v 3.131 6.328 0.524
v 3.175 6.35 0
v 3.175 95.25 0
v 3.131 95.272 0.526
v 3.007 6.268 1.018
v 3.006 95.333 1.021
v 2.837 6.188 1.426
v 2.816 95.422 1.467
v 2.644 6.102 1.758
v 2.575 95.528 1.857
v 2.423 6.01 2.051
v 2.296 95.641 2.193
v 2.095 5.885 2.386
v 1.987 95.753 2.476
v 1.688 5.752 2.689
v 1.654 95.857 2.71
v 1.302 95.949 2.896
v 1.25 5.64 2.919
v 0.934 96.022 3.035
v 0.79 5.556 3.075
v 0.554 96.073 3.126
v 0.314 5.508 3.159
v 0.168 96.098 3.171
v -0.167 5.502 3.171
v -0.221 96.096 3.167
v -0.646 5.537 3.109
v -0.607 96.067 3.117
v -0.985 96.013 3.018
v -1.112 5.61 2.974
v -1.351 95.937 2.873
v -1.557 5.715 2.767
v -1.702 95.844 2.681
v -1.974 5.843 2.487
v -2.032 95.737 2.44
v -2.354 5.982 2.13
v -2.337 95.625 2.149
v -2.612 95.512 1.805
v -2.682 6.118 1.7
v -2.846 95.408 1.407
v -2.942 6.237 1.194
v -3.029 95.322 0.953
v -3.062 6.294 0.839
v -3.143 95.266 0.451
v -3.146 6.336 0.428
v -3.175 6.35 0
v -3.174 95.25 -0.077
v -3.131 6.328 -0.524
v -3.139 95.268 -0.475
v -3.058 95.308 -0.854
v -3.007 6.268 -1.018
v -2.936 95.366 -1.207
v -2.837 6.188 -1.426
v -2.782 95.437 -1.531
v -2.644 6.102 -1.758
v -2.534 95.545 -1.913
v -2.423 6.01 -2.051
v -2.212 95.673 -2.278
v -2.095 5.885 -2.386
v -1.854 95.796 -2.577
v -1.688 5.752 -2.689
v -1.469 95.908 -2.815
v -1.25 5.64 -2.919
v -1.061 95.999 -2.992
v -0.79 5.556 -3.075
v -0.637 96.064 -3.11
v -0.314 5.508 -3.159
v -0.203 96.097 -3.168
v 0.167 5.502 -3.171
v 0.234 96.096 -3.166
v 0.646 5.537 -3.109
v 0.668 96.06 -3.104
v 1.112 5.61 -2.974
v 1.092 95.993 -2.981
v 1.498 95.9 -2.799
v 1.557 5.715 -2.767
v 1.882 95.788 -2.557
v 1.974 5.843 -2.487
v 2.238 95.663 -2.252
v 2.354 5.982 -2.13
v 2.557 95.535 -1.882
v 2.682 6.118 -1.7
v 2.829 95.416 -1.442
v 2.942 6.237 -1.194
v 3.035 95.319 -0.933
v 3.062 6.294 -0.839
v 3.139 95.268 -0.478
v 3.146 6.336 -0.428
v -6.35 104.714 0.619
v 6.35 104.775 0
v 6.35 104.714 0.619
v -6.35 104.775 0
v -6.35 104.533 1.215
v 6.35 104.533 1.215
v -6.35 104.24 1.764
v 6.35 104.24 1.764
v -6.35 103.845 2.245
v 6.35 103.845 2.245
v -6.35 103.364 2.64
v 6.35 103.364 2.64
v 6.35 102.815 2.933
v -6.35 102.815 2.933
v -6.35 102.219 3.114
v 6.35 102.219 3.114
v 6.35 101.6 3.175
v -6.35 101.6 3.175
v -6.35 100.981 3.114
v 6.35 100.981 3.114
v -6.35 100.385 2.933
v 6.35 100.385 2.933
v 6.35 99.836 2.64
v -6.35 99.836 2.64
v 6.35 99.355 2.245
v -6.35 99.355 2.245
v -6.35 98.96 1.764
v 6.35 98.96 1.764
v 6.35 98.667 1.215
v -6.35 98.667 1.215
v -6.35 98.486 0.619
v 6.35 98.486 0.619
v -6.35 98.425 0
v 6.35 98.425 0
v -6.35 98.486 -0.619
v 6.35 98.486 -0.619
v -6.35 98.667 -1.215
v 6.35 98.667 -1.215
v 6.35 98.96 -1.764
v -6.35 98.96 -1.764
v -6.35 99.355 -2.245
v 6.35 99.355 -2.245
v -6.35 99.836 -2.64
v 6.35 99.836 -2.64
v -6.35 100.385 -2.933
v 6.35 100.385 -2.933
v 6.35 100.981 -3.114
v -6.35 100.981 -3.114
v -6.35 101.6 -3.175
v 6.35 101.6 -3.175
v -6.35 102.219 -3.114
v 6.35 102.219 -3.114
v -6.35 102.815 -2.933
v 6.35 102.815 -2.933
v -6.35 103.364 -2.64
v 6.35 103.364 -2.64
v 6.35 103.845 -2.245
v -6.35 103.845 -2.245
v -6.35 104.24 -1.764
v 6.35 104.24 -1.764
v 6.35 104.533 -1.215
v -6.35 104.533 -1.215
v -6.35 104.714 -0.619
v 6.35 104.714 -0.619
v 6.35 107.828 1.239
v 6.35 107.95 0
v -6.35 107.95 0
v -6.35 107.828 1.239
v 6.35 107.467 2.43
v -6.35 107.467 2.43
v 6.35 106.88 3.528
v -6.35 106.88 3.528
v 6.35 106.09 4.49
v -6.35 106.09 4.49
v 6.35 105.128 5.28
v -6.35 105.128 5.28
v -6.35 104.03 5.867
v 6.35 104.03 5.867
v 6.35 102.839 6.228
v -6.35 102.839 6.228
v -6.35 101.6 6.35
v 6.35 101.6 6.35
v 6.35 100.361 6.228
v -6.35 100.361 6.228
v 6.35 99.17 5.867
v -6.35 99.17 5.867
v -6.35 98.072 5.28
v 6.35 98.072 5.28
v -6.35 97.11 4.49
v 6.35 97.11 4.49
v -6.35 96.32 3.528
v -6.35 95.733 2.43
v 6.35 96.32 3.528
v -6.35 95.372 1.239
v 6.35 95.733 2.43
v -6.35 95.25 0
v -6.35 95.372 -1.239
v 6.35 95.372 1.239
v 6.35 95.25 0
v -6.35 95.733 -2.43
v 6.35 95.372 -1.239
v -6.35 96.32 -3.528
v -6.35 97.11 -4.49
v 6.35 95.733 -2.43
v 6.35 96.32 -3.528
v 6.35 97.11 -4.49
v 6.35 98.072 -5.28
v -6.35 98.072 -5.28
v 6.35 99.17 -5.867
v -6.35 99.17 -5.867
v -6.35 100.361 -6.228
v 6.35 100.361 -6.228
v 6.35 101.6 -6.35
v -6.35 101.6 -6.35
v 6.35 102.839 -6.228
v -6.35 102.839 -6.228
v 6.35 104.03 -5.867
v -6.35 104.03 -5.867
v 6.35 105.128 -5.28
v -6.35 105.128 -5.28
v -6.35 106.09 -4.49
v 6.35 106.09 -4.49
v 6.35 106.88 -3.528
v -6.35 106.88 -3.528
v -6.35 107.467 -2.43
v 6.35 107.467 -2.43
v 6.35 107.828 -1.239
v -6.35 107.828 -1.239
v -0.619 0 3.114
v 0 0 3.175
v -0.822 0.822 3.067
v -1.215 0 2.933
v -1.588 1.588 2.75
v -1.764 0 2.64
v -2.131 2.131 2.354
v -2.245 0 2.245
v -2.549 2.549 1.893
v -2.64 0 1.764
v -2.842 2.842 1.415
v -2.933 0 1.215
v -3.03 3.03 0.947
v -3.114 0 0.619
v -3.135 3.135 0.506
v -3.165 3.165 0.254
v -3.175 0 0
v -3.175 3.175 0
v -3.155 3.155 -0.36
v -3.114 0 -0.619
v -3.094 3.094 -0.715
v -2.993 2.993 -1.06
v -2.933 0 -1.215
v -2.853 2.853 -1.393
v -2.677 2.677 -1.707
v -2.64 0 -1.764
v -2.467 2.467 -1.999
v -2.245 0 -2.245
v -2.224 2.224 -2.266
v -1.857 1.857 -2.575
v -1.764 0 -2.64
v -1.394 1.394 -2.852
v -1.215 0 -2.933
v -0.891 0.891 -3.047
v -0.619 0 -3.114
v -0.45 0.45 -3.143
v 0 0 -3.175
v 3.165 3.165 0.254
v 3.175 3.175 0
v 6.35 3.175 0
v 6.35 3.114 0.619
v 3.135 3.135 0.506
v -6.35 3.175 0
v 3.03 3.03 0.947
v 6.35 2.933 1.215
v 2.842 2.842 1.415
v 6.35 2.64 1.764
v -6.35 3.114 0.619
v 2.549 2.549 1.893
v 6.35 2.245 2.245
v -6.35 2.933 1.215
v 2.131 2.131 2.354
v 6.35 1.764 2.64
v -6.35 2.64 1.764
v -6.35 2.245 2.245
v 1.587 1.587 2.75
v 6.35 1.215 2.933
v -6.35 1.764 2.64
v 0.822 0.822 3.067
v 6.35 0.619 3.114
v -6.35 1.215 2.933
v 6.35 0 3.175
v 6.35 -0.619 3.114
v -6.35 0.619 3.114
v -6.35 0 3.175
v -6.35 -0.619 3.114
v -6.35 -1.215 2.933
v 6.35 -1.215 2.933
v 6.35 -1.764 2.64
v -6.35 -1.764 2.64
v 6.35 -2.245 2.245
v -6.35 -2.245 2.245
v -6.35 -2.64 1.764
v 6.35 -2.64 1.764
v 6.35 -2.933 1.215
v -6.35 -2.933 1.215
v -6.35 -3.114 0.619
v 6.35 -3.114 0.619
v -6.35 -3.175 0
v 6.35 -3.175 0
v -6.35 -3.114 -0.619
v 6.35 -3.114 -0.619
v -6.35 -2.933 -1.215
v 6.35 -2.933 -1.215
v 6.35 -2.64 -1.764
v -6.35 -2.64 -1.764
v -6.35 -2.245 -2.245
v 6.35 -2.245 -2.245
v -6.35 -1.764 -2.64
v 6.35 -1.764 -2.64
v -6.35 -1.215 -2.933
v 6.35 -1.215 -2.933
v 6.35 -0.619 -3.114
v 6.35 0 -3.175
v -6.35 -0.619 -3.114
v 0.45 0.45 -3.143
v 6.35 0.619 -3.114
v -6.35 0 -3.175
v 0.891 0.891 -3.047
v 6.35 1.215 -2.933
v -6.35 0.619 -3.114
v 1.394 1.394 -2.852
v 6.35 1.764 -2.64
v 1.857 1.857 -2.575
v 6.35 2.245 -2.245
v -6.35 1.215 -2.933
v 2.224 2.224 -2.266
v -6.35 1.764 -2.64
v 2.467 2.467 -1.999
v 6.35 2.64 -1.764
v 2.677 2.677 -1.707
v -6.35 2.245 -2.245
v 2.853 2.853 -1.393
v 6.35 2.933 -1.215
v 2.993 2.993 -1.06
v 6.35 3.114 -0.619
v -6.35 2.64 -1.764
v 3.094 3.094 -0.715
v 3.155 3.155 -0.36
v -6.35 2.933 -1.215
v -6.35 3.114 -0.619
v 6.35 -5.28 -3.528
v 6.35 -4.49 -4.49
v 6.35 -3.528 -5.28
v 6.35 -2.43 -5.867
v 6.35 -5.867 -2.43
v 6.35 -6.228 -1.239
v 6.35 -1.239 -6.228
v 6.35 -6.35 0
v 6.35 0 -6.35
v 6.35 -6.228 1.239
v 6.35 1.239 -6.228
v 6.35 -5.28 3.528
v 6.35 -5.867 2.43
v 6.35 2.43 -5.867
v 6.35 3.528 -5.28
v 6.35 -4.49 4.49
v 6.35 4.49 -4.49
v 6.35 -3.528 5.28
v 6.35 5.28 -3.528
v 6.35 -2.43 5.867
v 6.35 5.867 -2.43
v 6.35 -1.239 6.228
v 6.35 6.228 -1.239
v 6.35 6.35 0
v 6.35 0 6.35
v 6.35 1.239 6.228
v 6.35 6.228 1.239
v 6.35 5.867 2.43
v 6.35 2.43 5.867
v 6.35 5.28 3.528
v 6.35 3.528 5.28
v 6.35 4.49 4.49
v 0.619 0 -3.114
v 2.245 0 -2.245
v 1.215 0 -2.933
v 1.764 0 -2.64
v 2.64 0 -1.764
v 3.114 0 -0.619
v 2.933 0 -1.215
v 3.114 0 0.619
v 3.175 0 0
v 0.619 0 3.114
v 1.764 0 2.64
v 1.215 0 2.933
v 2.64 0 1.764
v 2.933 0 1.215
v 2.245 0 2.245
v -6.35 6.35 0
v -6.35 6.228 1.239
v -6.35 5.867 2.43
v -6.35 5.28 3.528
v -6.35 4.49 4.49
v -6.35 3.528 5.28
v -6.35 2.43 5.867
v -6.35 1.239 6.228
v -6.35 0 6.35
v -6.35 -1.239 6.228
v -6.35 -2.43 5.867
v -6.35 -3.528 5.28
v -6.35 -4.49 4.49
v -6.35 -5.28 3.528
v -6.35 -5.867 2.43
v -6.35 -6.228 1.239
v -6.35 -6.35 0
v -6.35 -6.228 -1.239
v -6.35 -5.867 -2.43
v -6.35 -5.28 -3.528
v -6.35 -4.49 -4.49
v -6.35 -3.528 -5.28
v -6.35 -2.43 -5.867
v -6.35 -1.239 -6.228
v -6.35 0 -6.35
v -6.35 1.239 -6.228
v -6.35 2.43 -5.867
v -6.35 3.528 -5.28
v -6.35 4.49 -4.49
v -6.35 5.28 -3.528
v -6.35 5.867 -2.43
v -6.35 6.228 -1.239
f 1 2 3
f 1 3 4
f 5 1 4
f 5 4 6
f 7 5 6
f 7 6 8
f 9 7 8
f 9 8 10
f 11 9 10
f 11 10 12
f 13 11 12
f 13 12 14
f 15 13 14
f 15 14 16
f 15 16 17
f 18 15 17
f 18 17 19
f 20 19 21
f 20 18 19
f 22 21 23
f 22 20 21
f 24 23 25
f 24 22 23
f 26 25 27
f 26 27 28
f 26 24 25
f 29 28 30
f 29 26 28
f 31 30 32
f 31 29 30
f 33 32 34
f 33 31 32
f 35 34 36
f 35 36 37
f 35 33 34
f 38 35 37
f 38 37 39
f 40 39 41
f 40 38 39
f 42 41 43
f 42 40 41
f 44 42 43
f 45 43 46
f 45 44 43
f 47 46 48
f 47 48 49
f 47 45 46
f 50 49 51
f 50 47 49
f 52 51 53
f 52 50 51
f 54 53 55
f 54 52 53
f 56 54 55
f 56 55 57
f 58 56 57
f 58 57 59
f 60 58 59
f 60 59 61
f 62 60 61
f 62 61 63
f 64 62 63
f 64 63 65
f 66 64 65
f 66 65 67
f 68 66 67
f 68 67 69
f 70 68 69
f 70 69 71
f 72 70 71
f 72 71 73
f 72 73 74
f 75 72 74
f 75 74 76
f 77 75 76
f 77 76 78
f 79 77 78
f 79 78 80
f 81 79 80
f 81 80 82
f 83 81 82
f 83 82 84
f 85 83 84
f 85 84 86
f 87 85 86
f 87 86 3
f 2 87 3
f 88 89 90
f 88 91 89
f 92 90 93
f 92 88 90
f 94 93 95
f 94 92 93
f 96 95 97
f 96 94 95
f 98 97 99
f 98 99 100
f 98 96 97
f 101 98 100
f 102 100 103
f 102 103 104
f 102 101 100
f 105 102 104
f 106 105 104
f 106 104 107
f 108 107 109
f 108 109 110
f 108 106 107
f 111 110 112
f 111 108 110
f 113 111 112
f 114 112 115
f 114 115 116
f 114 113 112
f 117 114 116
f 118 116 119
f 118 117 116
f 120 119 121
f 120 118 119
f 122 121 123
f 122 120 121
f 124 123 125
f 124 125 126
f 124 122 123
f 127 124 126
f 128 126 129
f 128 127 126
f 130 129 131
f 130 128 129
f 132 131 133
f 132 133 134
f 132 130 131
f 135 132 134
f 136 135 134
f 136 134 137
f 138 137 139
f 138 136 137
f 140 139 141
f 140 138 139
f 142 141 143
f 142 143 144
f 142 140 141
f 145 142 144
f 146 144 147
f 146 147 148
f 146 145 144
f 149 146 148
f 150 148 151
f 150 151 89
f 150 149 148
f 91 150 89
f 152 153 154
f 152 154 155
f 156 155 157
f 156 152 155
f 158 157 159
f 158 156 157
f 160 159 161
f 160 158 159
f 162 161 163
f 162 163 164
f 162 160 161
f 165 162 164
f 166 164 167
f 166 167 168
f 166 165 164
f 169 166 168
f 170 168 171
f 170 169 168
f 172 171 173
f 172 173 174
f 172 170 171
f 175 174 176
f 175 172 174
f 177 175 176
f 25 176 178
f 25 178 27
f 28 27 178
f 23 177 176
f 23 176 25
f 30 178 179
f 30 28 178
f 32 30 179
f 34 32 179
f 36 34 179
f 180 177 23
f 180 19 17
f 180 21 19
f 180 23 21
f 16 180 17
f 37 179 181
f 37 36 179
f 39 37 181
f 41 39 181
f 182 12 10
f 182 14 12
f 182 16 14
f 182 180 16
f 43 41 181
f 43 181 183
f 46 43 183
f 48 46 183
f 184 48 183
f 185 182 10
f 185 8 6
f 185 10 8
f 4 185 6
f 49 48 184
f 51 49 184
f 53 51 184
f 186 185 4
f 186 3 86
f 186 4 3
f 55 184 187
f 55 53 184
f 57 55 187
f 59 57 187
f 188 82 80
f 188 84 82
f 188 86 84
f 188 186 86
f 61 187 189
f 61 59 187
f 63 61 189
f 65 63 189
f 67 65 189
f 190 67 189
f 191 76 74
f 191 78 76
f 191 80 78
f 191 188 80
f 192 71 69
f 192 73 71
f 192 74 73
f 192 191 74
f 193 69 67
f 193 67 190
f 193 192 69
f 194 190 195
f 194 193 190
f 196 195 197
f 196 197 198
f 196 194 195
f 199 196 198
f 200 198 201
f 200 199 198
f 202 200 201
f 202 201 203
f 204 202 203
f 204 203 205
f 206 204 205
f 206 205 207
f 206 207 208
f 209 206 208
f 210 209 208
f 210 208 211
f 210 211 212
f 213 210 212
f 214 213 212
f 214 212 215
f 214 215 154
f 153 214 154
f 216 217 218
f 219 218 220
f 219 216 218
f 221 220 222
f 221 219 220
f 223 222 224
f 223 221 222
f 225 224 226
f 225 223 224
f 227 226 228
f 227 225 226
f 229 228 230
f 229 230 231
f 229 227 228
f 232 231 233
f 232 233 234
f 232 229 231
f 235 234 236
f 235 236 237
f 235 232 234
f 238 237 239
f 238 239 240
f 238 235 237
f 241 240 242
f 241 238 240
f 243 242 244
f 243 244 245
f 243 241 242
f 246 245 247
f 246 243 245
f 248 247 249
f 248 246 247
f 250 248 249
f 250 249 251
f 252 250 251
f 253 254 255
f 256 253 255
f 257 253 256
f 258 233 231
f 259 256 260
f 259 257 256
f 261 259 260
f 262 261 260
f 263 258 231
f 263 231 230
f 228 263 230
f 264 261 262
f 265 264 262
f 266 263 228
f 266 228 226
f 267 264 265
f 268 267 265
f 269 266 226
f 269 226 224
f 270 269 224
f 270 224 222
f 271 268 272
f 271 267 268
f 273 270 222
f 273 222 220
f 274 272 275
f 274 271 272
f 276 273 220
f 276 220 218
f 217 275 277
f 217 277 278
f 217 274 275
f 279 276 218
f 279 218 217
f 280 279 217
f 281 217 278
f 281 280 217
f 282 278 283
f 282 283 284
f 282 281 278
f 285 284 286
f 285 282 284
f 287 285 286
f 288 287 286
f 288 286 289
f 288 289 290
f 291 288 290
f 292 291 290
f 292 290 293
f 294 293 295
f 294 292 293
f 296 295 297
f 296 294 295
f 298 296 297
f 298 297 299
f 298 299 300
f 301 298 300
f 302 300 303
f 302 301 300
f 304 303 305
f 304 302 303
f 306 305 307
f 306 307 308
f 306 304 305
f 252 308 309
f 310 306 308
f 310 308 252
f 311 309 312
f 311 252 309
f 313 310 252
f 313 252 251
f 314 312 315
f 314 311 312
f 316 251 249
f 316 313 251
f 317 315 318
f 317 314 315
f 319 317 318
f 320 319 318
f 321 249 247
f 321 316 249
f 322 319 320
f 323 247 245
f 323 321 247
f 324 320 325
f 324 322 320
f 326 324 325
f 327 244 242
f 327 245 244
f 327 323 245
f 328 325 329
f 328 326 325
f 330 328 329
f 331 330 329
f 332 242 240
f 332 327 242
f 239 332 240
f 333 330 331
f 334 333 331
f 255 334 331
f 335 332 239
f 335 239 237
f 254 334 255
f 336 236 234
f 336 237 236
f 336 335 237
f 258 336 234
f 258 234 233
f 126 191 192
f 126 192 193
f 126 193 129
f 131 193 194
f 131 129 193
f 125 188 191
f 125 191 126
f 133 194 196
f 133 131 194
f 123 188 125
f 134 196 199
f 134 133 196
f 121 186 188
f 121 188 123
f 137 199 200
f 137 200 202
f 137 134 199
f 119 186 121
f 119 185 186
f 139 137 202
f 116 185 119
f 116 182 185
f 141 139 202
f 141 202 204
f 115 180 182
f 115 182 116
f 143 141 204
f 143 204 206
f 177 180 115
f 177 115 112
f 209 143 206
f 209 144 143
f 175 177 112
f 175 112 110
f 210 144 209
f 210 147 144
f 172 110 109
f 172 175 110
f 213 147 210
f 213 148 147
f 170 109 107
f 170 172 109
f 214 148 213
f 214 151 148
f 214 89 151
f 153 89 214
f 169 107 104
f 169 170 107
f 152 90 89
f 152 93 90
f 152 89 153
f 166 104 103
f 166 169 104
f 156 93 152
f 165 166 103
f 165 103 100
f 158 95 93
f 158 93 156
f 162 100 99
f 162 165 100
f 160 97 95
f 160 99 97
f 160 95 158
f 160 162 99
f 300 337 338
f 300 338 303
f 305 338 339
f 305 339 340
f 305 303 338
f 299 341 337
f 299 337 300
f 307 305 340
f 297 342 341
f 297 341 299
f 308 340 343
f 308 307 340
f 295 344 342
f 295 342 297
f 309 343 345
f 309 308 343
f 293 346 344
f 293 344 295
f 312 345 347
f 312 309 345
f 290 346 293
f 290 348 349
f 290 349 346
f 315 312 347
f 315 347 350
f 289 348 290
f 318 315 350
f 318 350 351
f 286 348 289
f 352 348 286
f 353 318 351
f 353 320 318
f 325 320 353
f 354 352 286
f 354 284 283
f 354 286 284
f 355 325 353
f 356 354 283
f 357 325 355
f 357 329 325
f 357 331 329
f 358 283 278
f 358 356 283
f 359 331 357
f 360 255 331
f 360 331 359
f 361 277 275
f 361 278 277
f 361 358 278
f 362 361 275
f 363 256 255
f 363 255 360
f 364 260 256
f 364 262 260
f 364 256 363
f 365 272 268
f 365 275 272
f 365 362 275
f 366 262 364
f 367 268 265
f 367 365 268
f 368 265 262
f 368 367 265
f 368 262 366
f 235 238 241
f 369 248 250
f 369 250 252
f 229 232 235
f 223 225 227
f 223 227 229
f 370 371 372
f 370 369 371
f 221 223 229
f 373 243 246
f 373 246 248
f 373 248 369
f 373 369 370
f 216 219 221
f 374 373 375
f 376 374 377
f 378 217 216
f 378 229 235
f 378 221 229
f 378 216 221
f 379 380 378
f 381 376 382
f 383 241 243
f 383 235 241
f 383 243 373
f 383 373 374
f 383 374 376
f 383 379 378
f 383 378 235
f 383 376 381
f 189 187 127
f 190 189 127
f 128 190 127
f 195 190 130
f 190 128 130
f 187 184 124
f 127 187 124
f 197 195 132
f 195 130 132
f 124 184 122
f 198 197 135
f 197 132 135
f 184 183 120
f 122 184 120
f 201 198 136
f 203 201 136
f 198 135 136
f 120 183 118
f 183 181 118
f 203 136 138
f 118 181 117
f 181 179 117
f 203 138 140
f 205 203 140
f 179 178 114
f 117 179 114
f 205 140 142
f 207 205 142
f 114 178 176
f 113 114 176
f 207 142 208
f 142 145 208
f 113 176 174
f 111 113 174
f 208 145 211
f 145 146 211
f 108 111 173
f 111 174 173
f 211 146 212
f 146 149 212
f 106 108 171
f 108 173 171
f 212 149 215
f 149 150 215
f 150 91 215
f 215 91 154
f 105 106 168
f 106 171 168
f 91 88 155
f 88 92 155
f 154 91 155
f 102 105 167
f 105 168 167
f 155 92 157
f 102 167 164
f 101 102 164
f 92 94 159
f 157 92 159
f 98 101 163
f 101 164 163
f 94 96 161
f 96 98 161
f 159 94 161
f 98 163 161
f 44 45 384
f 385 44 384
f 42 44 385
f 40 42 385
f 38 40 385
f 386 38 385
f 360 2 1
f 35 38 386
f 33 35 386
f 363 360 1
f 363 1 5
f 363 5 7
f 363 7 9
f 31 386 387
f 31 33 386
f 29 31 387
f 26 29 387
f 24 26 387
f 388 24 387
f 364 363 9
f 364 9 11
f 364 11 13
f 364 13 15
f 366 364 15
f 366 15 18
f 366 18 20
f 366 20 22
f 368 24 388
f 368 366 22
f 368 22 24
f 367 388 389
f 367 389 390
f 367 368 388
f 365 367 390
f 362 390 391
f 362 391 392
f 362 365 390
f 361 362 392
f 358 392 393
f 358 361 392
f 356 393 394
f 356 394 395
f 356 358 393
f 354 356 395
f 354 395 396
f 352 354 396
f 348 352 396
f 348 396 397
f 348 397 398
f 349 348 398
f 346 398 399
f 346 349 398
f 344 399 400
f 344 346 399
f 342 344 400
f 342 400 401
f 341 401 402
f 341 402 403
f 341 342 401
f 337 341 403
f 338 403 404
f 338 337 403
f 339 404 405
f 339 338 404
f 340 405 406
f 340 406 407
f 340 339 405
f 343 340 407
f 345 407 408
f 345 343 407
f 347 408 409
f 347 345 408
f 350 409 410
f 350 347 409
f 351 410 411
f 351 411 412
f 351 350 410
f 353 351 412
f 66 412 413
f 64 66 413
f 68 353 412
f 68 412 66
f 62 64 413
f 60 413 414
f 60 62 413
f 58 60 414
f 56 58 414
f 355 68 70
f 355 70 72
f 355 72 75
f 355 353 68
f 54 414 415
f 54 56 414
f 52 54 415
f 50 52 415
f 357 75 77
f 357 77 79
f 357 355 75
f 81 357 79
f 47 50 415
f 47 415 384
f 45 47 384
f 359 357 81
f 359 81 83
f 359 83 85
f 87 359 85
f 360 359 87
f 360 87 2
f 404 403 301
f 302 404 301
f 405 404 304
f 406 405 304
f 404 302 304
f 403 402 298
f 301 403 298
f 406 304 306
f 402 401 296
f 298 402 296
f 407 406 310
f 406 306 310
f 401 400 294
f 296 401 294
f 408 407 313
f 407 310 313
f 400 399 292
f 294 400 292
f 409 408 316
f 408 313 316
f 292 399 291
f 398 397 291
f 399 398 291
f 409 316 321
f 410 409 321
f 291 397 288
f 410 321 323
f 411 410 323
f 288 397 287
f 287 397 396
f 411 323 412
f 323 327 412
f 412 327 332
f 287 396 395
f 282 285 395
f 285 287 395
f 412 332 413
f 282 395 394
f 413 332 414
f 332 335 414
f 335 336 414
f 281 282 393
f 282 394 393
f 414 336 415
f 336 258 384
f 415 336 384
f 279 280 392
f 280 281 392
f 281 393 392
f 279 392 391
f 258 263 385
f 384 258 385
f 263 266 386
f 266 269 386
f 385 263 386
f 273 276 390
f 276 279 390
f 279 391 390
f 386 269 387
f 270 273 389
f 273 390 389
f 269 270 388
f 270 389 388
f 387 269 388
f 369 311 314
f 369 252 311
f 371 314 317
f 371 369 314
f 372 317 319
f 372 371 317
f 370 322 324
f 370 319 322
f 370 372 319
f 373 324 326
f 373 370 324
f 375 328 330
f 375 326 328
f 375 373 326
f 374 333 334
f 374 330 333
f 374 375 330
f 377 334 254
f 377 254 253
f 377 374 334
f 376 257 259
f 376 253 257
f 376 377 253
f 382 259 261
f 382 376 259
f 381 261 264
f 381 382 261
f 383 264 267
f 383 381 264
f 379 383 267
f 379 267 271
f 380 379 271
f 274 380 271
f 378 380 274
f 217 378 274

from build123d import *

# Parameters (mm, degrees)
F0_R     = 6.35
F0_R_2   = 3.175
F2_DEPTH = 6.35
F1_R     = 3.175
F3_DEPTH = 97.100738786


with BuildPart() as f2:
    # F0 (on Right) → F2 (new body, symmetric)
    with BuildSketch(Plane.YZ):
        Circle(F0_R)
        Circle(F0_R_2, mode=Mode.SUBTRACT)
    extrude(amount=F2_DEPTH, both=True)



with BuildPart() as f2b:
    # F0 (on Right) → F2, piece 2 (new body, symmetric)
    with BuildSketch(Plane.YZ):
        with Locations((101.6, 0)):
            Circle(F0_R)
        with Locations((101.6, 0)):
            Circle(F0_R_2, mode=Mode.SUBTRACT)
    extrude(amount=F2_DEPTH, both=True)


with BuildPart() as f2_1:
    add(f2.part)

    add(f2b.part)  # F3 merges F2b
    # F1 (on Front) → F3 (join, up to face)
    with BuildSketch(Plane.XZ):
        Circle(F1_R)
    extrude(amount=-F3_DEPTH)


solid = f2_1.part
